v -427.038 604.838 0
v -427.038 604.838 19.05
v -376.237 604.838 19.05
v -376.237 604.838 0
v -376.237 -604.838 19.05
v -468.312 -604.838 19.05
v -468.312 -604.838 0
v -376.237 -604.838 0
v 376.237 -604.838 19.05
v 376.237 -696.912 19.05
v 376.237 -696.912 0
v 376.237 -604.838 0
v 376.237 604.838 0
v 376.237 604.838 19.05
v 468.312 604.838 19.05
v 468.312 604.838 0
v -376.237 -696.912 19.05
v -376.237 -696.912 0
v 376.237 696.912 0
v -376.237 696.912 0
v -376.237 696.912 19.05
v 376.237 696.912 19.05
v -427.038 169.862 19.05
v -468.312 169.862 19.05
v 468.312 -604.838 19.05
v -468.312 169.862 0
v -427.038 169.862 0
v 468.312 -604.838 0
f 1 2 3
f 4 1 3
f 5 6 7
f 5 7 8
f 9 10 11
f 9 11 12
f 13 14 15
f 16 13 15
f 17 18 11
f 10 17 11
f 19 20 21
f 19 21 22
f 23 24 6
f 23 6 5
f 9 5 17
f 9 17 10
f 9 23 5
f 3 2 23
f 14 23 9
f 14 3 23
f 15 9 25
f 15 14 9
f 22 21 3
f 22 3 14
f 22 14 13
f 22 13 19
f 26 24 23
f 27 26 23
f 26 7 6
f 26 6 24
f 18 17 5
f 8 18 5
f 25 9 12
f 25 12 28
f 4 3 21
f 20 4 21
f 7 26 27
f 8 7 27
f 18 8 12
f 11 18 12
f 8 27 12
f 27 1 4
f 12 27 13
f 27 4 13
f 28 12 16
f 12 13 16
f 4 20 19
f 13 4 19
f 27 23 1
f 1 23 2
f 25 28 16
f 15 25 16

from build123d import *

# Parameters (mm, degrees)
F0_W     = 936.625
F0_H     = 1393.825
F1_DEPTH = 19.05
F2_W     = 92.075
F2_H     = 92.075
F3_DEPTH = 19.051
F4_W     = 41.275
F4_H     = 434.975
F5_DEPTH = 19.051


with BuildPart() as f1:
    # F0 (on Top) → F1 (new body)
    with BuildSketch(Plane.XY):
        Rectangle(F0_W, F0_H)
    extrude(amount=F1_DEPTH)

    # F2 (on face) → F3 (cut, through all)
    with BuildSketch(Plane.XY.offset(19.05)):
        with Locations((-422.275, 650.875)):
            Rectangle(F2_W, F2_H)
        with Locations((422.275, 650.875)):
            Rectangle(F2_W, F2_H)
        with Locations((422.275, -650.875)):
            Rectangle(F2_W, F2_H)
        with Locations((-422.275, -650.875)):
            Rectangle(F2_W, F2_H)
    extrude(amount=-F3_DEPTH, mode=Mode.SUBTRACT)

    # F4 (on face) → F5 (cut, through all)
    with BuildSketch(Plane.XY.offset(19.05)):
        with Locations((-447.675, 387.35)):
            Rectangle(F4_W, F4_H)
    extrude(amount=-F5_DEPTH, mode=Mode.SUBTRACT)


solid = f1.part
